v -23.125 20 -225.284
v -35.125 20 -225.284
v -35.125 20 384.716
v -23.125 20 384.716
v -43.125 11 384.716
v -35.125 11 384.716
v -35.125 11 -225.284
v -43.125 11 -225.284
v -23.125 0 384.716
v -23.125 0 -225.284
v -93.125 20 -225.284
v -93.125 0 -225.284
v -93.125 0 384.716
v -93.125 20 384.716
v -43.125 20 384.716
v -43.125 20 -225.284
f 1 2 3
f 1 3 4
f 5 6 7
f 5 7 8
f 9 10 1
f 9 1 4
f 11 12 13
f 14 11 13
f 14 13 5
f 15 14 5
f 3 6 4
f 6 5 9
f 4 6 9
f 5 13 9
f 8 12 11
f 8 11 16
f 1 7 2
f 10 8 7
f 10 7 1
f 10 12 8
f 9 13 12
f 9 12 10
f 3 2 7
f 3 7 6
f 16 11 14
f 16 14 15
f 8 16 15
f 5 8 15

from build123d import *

# Parameters (mm, degrees)
F0_W     = 70
F0_H     = 610
F1_DEPTH = 20
F2_W     = 8
F2_H     = 610
F3_DEPTH = 9


with BuildPart() as f1:
    # F0 (on Front) → F1 (new body)
    with BuildSketch(Plane.XZ):
        with Locations((-58.125427, 79.716102)):
            Rectangle(F0_W, F0_H)
    extrude(amount=-F1_DEPTH)

    # F2 (on face) → F3 (cut)
    with BuildSketch(Plane(origin=(0, 20, 0), x_dir=(-1, 0, 0), z_dir=(0, 1, 0))):
        with Locations((39.125427, 79.716102)):
            Rectangle(F2_W, F2_H)
    extrude(amount=-F3_DEPTH, mode=Mode.SUBTRACT)


solid = f1.part
